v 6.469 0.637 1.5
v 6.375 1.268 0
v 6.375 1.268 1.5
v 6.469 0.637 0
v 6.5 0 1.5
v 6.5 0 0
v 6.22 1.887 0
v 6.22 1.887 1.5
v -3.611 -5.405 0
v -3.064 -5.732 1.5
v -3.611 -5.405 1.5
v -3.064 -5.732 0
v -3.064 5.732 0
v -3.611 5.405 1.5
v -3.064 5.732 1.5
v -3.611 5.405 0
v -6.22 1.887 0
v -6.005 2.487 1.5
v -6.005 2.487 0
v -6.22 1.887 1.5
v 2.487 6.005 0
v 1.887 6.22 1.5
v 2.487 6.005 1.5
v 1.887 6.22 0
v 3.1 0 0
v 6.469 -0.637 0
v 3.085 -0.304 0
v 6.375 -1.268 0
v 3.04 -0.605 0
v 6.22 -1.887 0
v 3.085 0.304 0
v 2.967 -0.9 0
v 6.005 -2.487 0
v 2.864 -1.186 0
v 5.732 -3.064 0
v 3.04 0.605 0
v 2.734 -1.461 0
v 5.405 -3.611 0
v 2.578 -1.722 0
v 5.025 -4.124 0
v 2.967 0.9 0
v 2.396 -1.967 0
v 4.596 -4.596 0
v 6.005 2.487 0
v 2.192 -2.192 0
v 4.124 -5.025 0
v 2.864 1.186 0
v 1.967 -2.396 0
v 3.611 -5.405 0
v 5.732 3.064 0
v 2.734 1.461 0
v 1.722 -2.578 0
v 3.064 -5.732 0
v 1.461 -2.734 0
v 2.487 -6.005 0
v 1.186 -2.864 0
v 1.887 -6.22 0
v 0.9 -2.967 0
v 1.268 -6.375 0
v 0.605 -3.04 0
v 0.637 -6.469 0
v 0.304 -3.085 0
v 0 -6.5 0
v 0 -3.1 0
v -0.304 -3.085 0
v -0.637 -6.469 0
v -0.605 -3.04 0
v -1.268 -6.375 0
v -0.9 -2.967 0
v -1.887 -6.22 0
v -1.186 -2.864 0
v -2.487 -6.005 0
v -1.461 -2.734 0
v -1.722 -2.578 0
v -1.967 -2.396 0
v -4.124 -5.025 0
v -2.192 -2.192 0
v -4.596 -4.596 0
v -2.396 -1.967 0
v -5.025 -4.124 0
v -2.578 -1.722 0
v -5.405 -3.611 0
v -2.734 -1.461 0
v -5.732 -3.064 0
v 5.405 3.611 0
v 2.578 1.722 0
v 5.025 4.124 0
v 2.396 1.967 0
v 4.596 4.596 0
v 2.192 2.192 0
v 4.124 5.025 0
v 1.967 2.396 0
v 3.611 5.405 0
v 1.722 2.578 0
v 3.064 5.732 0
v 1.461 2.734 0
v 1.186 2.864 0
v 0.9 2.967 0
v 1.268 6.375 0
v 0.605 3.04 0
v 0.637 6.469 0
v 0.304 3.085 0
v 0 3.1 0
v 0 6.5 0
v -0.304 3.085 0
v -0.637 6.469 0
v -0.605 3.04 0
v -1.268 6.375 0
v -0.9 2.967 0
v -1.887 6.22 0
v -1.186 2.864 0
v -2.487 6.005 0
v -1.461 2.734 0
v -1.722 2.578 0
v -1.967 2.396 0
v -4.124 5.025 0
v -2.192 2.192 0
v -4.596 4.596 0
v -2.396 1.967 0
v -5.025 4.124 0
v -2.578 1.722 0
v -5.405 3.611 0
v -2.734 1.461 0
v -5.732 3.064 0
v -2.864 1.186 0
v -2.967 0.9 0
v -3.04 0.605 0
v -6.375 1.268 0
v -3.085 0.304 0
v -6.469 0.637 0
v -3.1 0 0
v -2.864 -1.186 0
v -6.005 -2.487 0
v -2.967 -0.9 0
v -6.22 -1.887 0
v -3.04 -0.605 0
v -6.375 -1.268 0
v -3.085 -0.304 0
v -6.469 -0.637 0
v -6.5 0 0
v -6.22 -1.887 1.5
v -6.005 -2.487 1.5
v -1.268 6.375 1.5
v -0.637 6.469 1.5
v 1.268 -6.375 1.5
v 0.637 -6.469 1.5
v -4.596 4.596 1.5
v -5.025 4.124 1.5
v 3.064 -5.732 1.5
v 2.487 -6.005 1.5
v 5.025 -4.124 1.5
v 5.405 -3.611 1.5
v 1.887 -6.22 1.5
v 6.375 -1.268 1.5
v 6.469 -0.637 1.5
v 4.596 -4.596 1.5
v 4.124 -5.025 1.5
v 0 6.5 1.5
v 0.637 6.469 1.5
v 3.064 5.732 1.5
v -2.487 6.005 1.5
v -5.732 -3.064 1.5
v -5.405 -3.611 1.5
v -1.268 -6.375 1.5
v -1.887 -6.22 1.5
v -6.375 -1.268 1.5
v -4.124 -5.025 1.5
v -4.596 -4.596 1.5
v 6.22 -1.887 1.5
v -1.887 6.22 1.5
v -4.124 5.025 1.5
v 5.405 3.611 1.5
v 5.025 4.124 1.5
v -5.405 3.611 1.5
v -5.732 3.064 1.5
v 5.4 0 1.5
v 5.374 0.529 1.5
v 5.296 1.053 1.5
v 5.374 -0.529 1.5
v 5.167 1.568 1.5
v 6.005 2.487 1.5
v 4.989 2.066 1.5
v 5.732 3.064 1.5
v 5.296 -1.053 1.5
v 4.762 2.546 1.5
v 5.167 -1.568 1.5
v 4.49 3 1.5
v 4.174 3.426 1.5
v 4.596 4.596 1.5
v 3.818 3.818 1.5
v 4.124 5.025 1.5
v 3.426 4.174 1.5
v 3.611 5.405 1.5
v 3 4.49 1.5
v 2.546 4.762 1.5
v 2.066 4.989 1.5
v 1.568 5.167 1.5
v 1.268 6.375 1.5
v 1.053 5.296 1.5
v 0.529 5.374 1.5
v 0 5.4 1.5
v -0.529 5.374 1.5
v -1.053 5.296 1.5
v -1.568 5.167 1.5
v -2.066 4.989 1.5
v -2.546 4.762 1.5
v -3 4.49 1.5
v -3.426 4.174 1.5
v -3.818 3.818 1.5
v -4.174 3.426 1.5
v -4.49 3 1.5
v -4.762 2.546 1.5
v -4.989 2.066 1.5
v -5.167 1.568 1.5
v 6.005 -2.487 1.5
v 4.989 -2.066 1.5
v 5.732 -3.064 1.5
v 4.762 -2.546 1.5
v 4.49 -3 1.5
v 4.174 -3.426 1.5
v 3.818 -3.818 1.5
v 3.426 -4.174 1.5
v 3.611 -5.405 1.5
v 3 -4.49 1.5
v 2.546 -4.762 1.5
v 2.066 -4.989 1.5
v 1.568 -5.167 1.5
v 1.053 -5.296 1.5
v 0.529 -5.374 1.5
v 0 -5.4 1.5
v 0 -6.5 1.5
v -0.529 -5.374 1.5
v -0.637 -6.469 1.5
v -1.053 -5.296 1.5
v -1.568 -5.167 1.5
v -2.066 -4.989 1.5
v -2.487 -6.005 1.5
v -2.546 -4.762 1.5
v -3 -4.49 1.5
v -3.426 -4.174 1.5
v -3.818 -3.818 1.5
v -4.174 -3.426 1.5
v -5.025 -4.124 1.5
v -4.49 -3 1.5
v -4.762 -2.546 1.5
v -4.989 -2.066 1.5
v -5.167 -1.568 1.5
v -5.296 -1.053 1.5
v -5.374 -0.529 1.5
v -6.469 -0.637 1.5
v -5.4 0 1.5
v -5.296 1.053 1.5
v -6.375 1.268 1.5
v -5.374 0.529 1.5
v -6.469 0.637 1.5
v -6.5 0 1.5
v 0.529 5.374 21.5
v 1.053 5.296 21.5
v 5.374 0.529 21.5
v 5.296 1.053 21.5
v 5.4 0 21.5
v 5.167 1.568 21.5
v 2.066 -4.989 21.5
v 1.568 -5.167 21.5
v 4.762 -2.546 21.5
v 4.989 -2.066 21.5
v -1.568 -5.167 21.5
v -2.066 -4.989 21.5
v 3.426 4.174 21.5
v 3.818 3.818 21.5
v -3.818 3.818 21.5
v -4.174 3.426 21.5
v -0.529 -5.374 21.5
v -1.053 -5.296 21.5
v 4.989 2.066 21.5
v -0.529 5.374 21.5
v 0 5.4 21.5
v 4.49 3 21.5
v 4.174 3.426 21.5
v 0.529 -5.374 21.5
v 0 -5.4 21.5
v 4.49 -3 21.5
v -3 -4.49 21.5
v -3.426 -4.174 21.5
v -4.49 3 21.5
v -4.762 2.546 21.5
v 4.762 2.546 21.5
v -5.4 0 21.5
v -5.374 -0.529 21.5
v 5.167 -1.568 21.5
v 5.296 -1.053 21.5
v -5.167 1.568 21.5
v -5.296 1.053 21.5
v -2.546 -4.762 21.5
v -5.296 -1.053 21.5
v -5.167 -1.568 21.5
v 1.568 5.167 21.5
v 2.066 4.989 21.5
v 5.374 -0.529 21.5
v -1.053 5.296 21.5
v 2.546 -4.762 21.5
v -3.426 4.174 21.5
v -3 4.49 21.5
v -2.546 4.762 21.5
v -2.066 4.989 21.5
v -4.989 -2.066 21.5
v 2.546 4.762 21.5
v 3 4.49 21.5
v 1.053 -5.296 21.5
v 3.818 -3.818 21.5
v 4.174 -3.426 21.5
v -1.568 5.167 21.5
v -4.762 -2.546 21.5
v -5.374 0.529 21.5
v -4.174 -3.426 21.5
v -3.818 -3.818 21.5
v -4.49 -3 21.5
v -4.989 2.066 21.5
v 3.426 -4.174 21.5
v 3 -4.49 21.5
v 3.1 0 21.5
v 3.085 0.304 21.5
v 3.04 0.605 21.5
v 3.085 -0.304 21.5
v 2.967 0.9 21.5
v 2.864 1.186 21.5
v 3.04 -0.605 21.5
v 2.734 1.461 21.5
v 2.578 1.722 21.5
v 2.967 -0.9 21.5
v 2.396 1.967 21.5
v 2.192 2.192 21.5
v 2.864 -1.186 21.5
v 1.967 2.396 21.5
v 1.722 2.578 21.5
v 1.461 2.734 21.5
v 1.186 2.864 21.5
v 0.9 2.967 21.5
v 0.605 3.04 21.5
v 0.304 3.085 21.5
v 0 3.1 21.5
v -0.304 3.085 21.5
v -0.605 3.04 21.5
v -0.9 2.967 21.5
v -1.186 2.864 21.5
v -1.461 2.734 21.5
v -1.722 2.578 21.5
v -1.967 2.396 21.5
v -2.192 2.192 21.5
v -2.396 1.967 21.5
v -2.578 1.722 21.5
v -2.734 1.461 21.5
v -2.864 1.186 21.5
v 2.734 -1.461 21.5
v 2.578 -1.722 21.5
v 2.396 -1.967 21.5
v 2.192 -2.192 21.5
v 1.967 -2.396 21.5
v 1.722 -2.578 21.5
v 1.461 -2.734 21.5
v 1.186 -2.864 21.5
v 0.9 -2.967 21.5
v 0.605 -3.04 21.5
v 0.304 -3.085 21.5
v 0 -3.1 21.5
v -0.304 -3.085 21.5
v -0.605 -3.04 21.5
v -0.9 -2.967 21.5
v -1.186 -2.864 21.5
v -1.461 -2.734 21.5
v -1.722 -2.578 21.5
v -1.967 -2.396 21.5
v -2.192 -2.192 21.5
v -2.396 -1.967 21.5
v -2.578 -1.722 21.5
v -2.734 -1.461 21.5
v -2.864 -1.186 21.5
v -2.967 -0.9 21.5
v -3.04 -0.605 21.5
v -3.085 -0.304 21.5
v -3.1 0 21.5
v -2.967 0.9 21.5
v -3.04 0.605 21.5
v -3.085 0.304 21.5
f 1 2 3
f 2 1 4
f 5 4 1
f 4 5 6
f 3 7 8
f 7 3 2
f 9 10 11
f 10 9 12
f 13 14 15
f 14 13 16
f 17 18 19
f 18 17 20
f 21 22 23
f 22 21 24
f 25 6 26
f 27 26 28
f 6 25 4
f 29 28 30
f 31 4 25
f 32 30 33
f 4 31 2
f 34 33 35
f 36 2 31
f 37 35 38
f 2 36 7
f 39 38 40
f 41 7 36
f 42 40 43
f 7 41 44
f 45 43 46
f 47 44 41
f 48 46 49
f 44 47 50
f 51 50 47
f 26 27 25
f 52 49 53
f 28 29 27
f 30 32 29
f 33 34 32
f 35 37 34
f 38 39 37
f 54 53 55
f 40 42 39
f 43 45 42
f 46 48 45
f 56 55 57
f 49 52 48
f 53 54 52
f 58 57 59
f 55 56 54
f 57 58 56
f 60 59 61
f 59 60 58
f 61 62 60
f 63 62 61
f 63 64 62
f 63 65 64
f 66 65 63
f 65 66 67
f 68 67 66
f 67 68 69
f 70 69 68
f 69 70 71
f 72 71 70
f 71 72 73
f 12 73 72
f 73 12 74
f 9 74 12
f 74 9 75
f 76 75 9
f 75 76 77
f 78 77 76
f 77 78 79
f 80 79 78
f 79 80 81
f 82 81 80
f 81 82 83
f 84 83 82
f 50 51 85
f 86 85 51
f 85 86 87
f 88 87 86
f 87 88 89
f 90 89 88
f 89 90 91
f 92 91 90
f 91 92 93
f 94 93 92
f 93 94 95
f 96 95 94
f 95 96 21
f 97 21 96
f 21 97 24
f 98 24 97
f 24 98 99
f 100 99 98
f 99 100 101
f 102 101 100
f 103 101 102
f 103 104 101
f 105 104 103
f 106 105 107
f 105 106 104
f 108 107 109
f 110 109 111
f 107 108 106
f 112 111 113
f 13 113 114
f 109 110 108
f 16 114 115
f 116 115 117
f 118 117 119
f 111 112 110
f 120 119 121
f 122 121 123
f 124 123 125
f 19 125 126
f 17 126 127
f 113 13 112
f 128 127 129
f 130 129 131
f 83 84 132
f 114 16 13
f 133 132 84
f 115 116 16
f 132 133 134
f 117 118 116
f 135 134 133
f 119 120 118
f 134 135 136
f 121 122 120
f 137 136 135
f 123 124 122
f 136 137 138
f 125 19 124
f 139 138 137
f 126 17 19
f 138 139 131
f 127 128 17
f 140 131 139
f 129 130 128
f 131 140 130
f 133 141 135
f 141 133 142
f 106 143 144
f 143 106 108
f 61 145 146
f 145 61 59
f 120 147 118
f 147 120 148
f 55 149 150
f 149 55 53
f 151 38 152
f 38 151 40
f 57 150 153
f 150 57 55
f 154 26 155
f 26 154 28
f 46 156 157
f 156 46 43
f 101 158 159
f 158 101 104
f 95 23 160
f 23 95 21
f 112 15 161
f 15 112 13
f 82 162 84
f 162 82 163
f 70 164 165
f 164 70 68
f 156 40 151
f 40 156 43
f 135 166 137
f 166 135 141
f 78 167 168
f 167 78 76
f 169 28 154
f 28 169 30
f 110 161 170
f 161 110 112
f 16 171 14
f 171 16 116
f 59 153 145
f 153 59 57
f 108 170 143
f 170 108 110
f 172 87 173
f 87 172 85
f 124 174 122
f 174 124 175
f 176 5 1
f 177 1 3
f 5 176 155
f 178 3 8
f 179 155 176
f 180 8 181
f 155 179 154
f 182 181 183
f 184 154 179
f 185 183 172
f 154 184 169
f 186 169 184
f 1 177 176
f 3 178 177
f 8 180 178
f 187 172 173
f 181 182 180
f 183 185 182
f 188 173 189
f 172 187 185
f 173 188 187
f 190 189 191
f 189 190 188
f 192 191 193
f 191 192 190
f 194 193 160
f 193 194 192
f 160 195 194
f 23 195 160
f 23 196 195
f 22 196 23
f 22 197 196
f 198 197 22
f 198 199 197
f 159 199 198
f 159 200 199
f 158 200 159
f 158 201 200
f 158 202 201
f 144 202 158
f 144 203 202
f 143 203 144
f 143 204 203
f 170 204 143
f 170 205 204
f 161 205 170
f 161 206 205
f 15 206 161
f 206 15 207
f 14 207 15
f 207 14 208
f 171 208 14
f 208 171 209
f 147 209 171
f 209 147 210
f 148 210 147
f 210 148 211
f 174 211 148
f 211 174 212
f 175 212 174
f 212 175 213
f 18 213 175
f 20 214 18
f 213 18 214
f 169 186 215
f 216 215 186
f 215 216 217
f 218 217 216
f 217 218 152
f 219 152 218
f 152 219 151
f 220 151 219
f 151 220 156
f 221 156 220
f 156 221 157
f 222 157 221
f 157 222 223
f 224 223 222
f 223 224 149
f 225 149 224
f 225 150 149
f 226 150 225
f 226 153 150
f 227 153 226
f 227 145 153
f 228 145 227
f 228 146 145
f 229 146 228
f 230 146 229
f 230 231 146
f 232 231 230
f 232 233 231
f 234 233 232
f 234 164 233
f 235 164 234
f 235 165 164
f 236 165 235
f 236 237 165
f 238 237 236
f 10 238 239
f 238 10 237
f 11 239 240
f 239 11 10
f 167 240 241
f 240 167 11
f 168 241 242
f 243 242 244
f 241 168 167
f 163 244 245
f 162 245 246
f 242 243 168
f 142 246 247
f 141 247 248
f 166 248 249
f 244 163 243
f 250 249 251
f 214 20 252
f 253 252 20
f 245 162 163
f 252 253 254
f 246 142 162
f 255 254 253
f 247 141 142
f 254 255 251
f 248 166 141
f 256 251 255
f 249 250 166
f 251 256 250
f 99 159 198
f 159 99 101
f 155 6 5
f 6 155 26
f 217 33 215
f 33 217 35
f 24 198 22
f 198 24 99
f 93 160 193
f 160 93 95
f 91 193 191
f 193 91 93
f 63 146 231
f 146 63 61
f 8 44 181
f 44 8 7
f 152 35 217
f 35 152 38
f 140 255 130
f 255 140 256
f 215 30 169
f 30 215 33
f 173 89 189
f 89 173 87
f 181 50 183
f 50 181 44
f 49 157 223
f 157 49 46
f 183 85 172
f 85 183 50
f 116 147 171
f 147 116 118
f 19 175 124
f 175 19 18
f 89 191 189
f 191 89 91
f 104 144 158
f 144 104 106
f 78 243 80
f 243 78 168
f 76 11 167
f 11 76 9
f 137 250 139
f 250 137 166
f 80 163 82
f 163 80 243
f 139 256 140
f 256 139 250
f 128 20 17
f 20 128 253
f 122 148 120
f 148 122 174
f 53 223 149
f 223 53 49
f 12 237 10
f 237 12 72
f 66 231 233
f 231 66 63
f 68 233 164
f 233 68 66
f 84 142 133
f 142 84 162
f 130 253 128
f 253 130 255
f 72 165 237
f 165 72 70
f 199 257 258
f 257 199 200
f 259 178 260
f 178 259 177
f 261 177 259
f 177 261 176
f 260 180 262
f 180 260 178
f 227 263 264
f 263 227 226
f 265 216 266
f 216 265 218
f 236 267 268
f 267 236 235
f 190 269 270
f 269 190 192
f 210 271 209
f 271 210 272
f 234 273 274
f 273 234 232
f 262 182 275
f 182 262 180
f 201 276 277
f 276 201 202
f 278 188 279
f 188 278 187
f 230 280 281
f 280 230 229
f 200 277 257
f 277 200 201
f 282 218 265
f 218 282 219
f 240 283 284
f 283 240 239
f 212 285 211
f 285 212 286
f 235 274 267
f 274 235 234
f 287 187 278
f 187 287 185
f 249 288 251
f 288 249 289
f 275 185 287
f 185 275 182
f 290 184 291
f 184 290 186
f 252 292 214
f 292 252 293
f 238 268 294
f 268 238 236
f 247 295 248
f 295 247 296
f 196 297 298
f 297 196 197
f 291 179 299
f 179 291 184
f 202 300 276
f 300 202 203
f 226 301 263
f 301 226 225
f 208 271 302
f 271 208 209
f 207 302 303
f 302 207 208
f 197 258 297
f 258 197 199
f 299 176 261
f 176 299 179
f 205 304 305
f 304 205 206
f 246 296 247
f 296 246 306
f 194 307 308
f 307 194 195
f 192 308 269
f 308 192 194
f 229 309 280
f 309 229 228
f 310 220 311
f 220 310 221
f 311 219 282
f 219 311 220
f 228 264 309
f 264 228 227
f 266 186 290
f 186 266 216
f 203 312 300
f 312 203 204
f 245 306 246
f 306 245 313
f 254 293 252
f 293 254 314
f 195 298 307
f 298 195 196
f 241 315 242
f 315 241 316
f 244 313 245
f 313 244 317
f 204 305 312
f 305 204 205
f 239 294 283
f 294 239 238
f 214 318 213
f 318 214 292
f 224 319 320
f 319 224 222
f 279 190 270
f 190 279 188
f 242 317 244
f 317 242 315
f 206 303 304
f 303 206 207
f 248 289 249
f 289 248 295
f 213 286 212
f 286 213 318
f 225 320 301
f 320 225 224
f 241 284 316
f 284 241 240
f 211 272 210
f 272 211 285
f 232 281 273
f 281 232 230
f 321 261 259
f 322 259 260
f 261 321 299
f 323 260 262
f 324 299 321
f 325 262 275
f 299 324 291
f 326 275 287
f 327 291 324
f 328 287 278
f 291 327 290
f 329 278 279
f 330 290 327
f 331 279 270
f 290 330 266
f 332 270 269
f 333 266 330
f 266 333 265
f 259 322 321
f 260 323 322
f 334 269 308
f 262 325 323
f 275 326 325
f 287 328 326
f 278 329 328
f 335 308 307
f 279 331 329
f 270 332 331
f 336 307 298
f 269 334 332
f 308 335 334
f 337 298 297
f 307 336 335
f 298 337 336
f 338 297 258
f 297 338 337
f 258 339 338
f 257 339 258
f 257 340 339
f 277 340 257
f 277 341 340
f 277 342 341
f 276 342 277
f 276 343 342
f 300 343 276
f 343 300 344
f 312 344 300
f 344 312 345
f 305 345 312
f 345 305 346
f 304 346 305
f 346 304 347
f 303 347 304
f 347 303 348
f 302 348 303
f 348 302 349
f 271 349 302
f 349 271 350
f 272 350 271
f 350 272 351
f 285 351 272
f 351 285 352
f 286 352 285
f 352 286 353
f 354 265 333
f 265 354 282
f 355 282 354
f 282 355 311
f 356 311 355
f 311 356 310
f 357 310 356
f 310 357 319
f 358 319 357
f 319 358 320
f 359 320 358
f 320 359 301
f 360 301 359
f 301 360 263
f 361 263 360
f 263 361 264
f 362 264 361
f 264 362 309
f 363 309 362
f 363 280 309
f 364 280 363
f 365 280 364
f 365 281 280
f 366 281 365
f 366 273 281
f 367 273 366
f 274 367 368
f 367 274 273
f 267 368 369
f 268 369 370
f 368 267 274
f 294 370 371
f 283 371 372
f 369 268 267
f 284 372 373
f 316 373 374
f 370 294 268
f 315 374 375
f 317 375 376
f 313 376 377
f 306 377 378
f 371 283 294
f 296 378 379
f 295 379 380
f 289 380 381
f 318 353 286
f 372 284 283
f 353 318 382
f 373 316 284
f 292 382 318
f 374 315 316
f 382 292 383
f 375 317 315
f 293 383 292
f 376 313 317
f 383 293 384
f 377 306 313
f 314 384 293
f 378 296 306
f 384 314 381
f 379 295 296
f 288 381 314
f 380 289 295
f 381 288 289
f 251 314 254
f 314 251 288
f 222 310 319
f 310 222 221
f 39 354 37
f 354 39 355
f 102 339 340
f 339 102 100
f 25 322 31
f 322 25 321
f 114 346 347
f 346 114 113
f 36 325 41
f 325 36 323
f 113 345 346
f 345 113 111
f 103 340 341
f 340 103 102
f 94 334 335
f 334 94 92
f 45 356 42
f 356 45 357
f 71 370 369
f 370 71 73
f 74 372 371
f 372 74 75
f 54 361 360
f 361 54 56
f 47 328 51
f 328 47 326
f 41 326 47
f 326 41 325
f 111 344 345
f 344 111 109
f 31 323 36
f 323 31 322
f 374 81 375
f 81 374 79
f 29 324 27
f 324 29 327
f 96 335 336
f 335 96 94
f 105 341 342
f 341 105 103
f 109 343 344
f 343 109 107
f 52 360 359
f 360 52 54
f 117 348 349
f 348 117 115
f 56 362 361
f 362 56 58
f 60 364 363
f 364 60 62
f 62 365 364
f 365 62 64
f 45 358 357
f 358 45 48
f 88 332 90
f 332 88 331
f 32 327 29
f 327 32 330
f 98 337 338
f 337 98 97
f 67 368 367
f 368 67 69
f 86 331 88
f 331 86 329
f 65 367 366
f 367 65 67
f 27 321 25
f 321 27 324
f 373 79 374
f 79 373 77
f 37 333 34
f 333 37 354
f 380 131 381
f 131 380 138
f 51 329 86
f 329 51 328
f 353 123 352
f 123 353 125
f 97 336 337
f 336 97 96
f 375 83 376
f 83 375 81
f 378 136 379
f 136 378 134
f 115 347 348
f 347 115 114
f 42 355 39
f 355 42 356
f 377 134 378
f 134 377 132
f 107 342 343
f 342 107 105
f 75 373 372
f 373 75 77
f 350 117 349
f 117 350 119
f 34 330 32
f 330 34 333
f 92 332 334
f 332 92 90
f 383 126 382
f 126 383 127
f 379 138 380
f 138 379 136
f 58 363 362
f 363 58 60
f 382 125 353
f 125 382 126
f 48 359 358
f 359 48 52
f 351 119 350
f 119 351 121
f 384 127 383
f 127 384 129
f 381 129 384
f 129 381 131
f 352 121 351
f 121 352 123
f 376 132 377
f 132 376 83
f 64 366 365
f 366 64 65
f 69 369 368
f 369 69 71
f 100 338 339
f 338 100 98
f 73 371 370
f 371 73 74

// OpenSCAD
// Adapter sleeve: 0.2 mL PCR tube in a 1.5 mL rack hole
// Print orientation: collar on the bed, sleeve body pointing up (+Z)

$fn = 64;

// ---- Dimensions (mm) ----
collar_d        = 13;     // collar outer diameter
collar_h        = 1.5;    // collar thickness (z = 0 to 1.5)
sleeve_od       = 10.8;   // sleeve body outer diameter
sleeve_top_z    = 21.5;   // top of sleeve body (sleeve height)
bore_d          = 6.2;    // straight through-bore diameter
eps             = 0.5;    // cutter overshoot past faces

difference() {
    union() {
        // Collar
        cylinder(d = collar_d, h = collar_h);
        // Sleeve body (slightly overlapping the collar for a clean union)
        translate([0, 0, collar_h - 0.01])
            cylinder(d = sleeve_od, h = sleeve_top_z - collar_h + 0.01);
    }
    // Full-height bore, open at both ends
    translate([0, 0, -eps])
        cylinder(d = bore_d, h = sleeve_top_z + 2 * eps);
}
